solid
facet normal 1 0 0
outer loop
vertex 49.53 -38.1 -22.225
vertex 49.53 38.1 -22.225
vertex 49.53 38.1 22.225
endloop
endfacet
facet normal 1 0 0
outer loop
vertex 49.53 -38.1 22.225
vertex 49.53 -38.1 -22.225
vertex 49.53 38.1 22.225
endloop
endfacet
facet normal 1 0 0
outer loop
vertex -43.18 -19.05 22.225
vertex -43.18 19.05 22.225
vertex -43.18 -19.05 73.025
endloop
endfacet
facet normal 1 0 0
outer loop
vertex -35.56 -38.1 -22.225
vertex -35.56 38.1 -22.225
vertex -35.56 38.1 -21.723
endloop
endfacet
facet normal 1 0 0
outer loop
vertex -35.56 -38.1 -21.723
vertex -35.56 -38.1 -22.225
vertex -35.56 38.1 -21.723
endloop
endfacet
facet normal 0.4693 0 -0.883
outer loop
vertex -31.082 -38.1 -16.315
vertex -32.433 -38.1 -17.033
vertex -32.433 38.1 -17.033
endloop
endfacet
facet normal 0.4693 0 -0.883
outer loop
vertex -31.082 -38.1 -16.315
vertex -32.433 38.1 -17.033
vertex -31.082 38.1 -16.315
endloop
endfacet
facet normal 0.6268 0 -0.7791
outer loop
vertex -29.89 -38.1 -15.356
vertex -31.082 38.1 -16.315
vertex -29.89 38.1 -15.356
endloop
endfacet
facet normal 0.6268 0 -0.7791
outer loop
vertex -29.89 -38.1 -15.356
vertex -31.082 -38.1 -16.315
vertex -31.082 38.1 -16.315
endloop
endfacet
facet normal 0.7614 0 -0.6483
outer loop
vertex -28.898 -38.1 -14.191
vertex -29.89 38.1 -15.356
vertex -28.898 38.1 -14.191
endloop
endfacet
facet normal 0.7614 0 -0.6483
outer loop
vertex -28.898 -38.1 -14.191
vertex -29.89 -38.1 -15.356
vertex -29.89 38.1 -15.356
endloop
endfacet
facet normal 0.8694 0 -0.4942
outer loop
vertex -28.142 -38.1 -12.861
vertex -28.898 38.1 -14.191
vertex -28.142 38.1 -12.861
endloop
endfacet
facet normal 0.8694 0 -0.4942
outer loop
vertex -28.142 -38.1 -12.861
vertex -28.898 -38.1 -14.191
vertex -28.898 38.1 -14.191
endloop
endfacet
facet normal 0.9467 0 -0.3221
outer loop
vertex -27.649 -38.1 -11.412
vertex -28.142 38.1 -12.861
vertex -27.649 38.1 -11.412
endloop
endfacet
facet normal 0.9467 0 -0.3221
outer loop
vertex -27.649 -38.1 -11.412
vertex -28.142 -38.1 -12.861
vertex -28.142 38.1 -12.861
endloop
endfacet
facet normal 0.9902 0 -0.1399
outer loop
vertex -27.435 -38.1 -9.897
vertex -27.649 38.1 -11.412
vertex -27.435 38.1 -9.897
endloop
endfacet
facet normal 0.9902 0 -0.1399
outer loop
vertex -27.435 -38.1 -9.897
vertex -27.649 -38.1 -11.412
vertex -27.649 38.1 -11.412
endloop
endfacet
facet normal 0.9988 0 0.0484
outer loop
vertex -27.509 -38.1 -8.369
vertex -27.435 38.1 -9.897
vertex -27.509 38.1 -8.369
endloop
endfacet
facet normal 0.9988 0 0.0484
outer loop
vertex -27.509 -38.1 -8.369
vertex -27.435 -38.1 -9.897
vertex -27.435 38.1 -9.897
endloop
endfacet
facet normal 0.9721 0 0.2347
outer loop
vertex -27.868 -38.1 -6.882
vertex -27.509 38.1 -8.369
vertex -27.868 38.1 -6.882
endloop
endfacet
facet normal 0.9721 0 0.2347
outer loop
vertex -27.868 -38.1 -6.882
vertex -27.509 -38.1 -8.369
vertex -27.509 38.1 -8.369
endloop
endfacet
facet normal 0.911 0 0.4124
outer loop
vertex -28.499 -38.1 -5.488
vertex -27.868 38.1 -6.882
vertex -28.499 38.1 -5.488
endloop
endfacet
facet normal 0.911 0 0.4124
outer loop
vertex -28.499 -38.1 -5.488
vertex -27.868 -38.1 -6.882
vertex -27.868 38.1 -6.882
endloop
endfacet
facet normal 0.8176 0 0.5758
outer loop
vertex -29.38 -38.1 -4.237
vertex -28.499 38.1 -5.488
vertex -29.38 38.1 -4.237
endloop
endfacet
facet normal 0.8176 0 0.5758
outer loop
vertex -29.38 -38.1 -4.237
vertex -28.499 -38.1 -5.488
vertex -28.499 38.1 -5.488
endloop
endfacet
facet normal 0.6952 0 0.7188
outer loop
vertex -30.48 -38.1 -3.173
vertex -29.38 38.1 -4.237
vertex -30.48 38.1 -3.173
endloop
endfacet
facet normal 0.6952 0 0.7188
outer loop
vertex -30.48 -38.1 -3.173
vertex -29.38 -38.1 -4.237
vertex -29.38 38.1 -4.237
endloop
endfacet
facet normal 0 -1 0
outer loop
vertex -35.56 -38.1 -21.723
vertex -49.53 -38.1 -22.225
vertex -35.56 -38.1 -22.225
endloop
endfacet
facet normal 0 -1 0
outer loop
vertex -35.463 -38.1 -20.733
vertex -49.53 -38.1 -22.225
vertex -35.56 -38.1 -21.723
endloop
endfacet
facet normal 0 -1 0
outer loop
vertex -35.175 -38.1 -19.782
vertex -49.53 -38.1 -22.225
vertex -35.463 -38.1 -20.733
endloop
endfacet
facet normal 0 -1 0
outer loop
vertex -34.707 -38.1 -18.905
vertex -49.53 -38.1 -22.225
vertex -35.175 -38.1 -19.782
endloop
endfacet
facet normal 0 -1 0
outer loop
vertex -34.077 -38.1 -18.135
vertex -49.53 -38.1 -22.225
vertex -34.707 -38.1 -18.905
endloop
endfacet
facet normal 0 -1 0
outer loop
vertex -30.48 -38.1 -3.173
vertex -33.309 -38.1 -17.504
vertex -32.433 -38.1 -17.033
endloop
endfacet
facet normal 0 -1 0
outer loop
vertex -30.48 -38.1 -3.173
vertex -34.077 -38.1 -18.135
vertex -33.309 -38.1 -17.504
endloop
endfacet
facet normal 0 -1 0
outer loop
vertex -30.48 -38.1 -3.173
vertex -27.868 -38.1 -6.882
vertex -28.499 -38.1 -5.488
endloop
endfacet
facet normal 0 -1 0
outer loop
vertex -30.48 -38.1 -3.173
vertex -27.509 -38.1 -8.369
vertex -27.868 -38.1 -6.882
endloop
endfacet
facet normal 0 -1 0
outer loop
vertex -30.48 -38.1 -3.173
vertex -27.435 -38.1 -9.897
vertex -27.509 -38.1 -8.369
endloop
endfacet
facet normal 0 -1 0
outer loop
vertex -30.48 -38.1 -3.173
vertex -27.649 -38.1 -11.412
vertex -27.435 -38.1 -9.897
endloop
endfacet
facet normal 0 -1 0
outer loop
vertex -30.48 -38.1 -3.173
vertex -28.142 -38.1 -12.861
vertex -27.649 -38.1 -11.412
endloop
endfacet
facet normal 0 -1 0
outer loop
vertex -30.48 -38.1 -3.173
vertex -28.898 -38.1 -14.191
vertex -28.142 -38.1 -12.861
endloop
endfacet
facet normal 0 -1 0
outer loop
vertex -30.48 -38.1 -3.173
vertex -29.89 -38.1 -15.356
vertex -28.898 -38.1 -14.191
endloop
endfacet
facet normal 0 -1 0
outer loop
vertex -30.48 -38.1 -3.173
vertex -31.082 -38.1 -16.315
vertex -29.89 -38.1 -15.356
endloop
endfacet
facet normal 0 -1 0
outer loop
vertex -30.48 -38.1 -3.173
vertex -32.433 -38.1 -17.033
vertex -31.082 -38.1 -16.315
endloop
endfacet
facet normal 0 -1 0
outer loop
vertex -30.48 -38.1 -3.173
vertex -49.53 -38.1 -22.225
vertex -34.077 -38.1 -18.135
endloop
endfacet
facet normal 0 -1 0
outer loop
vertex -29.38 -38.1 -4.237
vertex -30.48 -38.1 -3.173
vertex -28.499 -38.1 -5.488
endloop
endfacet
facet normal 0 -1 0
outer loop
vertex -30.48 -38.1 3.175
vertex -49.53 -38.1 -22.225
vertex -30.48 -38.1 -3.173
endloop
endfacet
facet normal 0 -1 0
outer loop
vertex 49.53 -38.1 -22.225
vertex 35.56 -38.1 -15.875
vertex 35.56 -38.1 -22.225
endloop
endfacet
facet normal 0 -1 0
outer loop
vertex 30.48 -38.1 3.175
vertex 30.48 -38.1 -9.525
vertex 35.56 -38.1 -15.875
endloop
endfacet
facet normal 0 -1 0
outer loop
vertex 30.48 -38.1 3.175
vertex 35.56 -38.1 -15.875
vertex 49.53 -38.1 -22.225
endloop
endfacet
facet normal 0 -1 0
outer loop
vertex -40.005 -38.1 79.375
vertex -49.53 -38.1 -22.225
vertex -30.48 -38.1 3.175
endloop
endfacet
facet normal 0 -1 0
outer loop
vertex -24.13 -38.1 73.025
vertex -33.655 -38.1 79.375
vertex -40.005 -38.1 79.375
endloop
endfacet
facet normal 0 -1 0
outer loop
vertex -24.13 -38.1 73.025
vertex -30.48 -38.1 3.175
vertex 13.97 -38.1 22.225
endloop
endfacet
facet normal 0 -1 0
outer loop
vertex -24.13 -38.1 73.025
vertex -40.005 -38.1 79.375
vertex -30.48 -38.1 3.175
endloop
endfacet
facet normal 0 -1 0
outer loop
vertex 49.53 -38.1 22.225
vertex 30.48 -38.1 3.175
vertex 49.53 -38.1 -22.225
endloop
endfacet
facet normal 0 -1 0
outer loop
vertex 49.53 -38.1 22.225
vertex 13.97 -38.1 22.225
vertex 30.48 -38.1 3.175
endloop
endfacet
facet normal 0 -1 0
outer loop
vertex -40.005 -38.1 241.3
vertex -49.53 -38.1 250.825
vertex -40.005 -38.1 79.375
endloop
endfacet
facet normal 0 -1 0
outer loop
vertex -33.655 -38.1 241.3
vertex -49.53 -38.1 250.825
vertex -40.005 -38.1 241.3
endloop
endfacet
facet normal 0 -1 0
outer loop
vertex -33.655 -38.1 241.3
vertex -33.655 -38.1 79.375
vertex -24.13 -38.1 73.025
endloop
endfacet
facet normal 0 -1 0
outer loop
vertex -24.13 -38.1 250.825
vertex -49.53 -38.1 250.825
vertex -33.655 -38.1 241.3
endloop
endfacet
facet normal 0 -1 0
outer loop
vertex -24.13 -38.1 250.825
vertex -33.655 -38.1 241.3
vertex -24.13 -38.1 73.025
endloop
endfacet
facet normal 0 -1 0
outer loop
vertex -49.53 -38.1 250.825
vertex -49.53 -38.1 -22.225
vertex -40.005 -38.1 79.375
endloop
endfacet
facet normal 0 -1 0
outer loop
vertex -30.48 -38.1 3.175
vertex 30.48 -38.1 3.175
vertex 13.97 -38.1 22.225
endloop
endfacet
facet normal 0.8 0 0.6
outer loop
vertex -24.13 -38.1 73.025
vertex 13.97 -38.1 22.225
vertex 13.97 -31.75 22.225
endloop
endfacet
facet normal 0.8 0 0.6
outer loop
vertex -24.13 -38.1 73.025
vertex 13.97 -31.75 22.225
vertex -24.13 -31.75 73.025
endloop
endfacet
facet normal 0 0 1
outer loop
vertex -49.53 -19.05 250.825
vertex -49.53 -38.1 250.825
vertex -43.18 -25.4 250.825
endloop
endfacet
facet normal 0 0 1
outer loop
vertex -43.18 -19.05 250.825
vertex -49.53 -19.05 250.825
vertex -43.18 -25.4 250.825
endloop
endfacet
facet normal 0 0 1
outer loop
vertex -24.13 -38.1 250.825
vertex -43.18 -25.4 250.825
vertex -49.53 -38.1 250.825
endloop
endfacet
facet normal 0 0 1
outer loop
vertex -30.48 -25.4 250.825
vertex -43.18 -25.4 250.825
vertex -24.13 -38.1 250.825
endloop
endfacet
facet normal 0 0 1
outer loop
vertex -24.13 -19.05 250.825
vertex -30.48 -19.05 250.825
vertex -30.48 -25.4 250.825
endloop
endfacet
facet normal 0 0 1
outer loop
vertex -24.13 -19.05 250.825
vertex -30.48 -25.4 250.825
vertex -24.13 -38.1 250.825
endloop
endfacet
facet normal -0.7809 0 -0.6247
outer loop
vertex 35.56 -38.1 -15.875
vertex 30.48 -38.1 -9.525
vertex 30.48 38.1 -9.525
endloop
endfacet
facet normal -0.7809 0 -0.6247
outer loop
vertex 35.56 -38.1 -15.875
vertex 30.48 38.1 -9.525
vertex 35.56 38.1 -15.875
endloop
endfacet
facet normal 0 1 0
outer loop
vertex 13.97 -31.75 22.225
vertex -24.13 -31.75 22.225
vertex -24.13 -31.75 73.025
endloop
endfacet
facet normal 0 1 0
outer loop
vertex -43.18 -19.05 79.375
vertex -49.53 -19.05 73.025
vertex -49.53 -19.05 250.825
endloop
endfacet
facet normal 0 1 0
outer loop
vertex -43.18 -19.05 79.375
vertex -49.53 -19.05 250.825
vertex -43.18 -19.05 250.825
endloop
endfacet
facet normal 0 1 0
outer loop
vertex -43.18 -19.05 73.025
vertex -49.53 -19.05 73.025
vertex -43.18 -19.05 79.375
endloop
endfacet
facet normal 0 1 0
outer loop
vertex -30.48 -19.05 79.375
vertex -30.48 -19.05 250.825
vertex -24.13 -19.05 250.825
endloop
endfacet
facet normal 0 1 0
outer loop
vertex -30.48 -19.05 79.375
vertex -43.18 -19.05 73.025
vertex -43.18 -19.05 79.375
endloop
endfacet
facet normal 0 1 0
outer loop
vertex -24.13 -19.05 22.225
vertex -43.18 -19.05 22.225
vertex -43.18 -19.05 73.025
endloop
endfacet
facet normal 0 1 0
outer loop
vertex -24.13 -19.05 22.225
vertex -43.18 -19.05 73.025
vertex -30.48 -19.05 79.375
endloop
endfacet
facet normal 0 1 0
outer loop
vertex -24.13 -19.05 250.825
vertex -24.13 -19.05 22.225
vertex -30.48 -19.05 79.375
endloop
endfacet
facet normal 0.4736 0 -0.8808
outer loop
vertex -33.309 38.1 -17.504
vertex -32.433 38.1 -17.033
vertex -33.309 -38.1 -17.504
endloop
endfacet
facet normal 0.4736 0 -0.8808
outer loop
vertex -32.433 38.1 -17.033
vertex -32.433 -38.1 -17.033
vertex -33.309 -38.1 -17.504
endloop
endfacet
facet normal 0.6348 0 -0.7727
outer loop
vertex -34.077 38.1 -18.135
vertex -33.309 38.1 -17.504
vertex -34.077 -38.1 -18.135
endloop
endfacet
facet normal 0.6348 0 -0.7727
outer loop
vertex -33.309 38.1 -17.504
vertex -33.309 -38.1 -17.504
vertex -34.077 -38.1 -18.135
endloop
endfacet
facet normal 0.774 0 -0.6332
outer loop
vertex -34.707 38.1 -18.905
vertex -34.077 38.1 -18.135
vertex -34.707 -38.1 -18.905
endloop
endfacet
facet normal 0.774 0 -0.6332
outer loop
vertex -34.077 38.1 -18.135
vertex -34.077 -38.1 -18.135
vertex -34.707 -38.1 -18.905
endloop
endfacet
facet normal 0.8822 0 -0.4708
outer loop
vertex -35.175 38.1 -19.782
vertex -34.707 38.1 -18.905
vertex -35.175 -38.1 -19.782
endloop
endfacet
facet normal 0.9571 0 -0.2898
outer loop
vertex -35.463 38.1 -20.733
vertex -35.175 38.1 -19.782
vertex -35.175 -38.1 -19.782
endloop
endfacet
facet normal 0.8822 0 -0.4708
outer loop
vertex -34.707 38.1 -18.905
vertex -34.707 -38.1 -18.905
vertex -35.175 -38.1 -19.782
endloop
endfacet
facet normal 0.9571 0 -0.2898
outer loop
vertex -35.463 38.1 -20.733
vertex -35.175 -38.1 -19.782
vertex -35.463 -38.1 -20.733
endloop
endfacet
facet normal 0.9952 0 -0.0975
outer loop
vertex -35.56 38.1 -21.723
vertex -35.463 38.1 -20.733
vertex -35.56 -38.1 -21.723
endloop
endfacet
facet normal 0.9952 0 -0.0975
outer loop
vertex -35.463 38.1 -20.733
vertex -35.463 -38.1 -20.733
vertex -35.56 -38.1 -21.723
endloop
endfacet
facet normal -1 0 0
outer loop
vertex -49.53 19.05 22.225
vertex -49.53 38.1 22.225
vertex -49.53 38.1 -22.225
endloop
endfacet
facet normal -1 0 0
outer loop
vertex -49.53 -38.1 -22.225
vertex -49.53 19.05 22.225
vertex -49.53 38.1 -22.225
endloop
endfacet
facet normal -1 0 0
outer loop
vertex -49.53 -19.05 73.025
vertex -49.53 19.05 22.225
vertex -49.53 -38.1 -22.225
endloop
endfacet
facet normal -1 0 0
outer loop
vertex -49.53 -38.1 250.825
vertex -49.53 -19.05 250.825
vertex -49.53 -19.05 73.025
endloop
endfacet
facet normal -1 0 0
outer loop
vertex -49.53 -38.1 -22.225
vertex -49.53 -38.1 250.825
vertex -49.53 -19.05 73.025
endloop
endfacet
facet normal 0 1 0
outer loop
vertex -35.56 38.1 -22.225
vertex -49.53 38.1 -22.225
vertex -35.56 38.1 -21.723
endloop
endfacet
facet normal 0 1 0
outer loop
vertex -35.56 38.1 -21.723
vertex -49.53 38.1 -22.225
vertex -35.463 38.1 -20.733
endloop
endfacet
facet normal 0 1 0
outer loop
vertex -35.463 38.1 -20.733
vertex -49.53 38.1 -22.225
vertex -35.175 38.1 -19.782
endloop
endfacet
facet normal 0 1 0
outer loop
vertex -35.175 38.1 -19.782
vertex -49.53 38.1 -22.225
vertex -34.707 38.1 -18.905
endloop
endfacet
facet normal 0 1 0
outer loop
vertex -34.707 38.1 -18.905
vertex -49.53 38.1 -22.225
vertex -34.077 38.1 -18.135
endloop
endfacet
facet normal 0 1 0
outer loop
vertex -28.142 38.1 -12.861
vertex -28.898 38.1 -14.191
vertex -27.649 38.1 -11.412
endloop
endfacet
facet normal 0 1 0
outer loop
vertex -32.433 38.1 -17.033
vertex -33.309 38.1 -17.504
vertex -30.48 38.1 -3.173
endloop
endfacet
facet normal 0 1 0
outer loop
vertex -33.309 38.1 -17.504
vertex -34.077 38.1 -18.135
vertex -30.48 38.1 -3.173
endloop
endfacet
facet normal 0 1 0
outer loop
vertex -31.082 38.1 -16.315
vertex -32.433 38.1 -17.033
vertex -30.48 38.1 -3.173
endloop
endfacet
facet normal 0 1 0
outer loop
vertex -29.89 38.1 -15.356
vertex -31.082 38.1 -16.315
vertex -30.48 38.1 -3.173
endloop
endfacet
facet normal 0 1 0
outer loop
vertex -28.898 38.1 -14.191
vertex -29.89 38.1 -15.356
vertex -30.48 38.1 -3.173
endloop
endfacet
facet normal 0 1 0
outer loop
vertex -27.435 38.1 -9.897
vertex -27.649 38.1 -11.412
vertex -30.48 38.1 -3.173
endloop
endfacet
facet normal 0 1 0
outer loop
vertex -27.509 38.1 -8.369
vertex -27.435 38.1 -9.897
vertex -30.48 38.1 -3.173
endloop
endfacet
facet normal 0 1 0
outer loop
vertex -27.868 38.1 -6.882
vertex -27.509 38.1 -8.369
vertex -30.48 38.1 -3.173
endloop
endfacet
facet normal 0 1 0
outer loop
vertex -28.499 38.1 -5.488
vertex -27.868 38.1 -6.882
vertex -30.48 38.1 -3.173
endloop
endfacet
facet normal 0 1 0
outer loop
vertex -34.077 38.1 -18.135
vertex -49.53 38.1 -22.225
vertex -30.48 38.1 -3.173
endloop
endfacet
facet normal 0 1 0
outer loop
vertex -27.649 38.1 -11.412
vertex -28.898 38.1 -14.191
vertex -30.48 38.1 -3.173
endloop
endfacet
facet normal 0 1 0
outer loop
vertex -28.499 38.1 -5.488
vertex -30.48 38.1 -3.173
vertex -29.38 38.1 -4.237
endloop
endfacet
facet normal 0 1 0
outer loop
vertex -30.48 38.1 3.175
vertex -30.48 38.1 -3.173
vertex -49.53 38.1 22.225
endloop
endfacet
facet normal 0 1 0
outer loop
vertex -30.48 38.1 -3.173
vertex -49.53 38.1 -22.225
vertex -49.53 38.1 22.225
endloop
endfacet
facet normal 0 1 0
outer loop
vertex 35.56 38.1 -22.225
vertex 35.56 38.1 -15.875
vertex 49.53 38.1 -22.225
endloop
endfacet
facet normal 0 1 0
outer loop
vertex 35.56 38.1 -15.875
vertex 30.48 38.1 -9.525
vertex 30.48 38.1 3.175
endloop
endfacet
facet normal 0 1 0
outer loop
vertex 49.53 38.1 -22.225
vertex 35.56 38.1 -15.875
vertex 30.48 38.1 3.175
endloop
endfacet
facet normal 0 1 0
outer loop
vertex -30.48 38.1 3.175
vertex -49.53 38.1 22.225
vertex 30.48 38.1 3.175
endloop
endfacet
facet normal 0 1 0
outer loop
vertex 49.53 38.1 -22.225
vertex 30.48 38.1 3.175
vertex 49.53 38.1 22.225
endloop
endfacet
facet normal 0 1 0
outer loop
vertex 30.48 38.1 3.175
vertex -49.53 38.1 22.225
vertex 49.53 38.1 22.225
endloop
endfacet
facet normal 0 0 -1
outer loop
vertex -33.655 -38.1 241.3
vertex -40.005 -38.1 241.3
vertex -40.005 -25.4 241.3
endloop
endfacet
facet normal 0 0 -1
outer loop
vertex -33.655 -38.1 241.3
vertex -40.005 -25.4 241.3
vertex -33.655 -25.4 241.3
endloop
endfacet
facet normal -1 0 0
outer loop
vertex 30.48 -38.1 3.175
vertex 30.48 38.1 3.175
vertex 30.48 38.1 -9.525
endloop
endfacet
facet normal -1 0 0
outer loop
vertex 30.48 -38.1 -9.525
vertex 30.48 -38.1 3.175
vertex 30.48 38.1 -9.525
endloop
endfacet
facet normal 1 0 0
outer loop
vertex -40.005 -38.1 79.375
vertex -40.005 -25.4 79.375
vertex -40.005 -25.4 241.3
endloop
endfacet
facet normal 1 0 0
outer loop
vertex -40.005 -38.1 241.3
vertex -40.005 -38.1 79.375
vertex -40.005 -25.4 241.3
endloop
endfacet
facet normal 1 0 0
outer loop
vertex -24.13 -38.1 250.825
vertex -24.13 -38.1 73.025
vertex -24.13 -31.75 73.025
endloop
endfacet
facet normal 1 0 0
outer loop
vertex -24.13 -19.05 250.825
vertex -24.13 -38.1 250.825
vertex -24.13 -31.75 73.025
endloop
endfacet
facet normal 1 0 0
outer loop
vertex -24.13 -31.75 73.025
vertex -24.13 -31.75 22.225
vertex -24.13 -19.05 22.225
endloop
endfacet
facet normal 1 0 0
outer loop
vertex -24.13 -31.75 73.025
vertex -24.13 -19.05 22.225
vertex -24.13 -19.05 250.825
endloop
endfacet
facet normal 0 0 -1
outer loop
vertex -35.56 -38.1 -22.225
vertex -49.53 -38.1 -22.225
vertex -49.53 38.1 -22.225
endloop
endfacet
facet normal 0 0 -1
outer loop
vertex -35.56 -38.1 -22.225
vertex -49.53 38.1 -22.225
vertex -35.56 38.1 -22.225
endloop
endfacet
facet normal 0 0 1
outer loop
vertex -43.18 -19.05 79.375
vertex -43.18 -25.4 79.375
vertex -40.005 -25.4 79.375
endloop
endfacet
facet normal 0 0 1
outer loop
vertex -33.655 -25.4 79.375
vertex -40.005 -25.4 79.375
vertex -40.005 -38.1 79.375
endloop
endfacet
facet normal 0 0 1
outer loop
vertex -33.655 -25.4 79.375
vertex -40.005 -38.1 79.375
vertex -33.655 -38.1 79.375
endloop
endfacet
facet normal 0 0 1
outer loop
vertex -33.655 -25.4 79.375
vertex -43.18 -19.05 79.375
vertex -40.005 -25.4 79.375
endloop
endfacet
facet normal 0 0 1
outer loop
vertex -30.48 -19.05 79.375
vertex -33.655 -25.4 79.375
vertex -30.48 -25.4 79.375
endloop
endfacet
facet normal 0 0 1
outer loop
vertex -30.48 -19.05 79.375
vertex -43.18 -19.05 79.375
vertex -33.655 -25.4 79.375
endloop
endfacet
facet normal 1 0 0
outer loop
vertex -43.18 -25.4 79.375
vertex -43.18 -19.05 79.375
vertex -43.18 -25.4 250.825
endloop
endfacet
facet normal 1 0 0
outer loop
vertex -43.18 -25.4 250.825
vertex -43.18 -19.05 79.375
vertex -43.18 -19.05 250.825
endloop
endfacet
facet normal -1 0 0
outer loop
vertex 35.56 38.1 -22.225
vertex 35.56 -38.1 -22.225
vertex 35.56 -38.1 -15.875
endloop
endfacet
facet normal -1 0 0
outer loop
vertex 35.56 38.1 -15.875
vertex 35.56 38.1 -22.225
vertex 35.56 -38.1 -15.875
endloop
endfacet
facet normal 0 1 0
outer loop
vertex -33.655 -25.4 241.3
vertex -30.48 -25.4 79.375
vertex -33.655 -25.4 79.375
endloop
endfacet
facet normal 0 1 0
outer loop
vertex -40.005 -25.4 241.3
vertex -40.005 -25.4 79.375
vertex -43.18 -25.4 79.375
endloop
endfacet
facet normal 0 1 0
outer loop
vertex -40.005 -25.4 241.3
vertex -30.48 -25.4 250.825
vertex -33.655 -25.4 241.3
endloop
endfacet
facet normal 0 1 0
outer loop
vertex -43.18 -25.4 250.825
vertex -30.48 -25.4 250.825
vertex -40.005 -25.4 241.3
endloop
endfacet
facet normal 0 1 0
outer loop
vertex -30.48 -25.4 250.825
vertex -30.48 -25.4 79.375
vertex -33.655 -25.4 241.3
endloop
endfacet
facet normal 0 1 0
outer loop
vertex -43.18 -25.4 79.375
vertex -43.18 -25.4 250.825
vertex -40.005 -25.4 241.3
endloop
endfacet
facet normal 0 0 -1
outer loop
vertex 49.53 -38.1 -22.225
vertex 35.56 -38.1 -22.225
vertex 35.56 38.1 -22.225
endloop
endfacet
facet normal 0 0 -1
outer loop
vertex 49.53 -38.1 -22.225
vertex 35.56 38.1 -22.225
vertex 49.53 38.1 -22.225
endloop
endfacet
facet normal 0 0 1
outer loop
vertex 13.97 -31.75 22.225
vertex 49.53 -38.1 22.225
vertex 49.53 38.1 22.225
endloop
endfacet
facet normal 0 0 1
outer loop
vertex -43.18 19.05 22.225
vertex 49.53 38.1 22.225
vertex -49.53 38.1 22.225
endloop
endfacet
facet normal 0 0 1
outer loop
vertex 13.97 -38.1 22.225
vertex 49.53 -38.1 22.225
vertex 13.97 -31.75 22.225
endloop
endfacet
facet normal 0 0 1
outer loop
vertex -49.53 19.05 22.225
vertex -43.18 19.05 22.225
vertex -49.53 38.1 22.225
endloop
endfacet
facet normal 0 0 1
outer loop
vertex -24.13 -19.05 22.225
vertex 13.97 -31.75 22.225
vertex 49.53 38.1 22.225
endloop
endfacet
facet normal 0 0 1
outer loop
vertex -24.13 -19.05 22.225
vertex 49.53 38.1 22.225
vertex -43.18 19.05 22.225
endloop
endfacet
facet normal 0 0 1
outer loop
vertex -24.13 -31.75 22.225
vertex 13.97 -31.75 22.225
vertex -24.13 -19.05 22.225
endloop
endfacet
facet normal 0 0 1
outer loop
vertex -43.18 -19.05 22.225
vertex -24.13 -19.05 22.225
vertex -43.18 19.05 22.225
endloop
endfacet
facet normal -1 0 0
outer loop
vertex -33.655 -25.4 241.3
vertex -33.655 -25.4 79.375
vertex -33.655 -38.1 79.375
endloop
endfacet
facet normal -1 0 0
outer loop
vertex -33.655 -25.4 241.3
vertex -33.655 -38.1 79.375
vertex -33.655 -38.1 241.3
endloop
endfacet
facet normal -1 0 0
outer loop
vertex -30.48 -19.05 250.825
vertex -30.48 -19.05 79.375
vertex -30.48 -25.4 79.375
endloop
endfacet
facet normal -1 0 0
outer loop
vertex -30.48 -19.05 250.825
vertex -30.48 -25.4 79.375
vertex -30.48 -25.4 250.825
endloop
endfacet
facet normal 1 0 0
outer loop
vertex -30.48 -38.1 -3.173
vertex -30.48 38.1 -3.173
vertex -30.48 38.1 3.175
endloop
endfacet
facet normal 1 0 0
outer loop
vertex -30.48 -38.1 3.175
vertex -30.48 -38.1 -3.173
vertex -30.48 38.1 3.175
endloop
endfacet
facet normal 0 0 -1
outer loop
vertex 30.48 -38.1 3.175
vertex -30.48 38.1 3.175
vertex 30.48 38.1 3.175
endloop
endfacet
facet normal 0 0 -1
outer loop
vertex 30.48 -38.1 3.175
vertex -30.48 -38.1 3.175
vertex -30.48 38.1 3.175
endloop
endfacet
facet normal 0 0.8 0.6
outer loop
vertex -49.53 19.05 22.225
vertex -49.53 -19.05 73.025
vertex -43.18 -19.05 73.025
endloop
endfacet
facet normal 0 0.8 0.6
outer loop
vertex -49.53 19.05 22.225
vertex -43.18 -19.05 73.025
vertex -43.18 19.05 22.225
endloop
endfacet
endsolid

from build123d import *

# Parameters (mm, degrees)
F1_DEPTH  = 38.1
F2_W      = 71.12
F2_H      = 27.3908400369
F3_DEPTH  = 50.8
F4_W      = 25.4
F4_H      = 19.05
F5_DEPTH  = 228.6
F7_DEPTH  = 6.35
F8_W      = 12.7
F8_H      = 165.1
F9_DEPTH  = 6.35
F10_W     = 6.35
F10_H     = 161.925
F11_DEPTH = 127
F13_DEPTH = 6.35
F14_W     = 12.7
F14_H     = 15.3125979424
F15_DEPTH = 6.35
F16_R     = 8.1334843178
F17_DEPTH = 76.2
F18_R     = 5.08
F20_DEPTH = 76.2


with BuildPart() as f1:
    # F0 (on Front) → F1 (new body, symmetric)
    with BuildSketch(Plane.XZ):
        Polygon((30.48, -22.225), (49.53, -22.225), (49.53, 22.225), (-49.53, 22.225), (-49.53, -22.225), (-30.48, -22.225), (-30.48, 3.175), (30.48, 3.175), align=None)
    extrude(amount=F1_DEPTH, both=True)

    # F2 (on Front) → F3 (cut, symmetric)
    with BuildSketch(Plane.XZ):
        with Locations((0, -23.2204200185)):
            Rectangle(F2_W, F2_H)
    extrude(amount=F3_DEPTH, both=True, mode=Mode.SUBTRACT)

    # F4 (on face) → F5 (join)
    with BuildSketch(Plane.XY.offset(22.225)):
        with Locations((-36.83, -28.575)):
            Rectangle(F4_W, F4_H)
    extrude(amount=F5_DEPTH)

    # F6 (on face) → F7 (join)
    with BuildSketch(Plane.XZ.offset(38.1)):
        Polygon((-24.13, 73.025), (-24.13, 22.225), (13.97, 22.225), align=None)
    extrude(amount=-F7_DEPTH)

    # F8 (on face) → F9 (cut)
    with BuildSketch(Plane(origin=(0, -19.05, 0), x_dir=(-1, 0, 0), z_dir=(0, 1, 0))):
        with Locations((36.83, 161.925)):
            Rectangle(F8_W, F8_H)
    extrude(amount=-F9_DEPTH, mode=Mode.SUBTRACT)

    # F10 (on Front) → F11 (cut)
    with BuildSketch(Plane.XZ):
        with Locations((-36.83, 160.3375)):
            Rectangle(F10_W, F10_H)
    extrude(amount=F11_DEPTH, mode=Mode.SUBTRACT)

    # F12 (on face) → F13 (join)
    with BuildSketch(Plane(origin=(-49.53, 0, 0), x_dir=(0, -1, 0), z_dir=(-1, 0, 0))):
        Polygon((-19.05, 22.225), (19.05, 22.225), (19.05, 73.025), align=None)
    extrude(amount=-F13_DEPTH)

    # F14 (on face) → F15 (cut)
    with BuildSketch(Plane(origin=(0, -19.05, 0), x_dir=(-1, 0, 0), z_dir=(0, 1, 0))):
        with Locations((36.83, 244.475)):
            Rectangle(F14_W, F14_H)
    extrude(amount=-F15_DEPTH, mode=Mode.SUBTRACT)

    # F16 (on face) → F17 (join)
    with BuildSketch(Plane.XZ.offset(38.1)):
        with Locations((-35.56, -9.525)):
            Circle(F16_R)
    extrude(amount=-F17_DEPTH)

    # F18
    f18_edges = [f1.edges().sort_by_distance(p)[0] for p in [
        (-35.56, 0, -17.658484),
    ]]
    fillet(f18_edges, radius=F18_R)

    # F19 (on face) → F20 (join)
    with BuildSketch(Plane.XZ.offset(38.1)):
        Polygon((35.56, -9.525), (30.48, -9.525), (35.56, -15.875), align=None)
    extrude(amount=-F20_DEPTH)


solid = f1.part
